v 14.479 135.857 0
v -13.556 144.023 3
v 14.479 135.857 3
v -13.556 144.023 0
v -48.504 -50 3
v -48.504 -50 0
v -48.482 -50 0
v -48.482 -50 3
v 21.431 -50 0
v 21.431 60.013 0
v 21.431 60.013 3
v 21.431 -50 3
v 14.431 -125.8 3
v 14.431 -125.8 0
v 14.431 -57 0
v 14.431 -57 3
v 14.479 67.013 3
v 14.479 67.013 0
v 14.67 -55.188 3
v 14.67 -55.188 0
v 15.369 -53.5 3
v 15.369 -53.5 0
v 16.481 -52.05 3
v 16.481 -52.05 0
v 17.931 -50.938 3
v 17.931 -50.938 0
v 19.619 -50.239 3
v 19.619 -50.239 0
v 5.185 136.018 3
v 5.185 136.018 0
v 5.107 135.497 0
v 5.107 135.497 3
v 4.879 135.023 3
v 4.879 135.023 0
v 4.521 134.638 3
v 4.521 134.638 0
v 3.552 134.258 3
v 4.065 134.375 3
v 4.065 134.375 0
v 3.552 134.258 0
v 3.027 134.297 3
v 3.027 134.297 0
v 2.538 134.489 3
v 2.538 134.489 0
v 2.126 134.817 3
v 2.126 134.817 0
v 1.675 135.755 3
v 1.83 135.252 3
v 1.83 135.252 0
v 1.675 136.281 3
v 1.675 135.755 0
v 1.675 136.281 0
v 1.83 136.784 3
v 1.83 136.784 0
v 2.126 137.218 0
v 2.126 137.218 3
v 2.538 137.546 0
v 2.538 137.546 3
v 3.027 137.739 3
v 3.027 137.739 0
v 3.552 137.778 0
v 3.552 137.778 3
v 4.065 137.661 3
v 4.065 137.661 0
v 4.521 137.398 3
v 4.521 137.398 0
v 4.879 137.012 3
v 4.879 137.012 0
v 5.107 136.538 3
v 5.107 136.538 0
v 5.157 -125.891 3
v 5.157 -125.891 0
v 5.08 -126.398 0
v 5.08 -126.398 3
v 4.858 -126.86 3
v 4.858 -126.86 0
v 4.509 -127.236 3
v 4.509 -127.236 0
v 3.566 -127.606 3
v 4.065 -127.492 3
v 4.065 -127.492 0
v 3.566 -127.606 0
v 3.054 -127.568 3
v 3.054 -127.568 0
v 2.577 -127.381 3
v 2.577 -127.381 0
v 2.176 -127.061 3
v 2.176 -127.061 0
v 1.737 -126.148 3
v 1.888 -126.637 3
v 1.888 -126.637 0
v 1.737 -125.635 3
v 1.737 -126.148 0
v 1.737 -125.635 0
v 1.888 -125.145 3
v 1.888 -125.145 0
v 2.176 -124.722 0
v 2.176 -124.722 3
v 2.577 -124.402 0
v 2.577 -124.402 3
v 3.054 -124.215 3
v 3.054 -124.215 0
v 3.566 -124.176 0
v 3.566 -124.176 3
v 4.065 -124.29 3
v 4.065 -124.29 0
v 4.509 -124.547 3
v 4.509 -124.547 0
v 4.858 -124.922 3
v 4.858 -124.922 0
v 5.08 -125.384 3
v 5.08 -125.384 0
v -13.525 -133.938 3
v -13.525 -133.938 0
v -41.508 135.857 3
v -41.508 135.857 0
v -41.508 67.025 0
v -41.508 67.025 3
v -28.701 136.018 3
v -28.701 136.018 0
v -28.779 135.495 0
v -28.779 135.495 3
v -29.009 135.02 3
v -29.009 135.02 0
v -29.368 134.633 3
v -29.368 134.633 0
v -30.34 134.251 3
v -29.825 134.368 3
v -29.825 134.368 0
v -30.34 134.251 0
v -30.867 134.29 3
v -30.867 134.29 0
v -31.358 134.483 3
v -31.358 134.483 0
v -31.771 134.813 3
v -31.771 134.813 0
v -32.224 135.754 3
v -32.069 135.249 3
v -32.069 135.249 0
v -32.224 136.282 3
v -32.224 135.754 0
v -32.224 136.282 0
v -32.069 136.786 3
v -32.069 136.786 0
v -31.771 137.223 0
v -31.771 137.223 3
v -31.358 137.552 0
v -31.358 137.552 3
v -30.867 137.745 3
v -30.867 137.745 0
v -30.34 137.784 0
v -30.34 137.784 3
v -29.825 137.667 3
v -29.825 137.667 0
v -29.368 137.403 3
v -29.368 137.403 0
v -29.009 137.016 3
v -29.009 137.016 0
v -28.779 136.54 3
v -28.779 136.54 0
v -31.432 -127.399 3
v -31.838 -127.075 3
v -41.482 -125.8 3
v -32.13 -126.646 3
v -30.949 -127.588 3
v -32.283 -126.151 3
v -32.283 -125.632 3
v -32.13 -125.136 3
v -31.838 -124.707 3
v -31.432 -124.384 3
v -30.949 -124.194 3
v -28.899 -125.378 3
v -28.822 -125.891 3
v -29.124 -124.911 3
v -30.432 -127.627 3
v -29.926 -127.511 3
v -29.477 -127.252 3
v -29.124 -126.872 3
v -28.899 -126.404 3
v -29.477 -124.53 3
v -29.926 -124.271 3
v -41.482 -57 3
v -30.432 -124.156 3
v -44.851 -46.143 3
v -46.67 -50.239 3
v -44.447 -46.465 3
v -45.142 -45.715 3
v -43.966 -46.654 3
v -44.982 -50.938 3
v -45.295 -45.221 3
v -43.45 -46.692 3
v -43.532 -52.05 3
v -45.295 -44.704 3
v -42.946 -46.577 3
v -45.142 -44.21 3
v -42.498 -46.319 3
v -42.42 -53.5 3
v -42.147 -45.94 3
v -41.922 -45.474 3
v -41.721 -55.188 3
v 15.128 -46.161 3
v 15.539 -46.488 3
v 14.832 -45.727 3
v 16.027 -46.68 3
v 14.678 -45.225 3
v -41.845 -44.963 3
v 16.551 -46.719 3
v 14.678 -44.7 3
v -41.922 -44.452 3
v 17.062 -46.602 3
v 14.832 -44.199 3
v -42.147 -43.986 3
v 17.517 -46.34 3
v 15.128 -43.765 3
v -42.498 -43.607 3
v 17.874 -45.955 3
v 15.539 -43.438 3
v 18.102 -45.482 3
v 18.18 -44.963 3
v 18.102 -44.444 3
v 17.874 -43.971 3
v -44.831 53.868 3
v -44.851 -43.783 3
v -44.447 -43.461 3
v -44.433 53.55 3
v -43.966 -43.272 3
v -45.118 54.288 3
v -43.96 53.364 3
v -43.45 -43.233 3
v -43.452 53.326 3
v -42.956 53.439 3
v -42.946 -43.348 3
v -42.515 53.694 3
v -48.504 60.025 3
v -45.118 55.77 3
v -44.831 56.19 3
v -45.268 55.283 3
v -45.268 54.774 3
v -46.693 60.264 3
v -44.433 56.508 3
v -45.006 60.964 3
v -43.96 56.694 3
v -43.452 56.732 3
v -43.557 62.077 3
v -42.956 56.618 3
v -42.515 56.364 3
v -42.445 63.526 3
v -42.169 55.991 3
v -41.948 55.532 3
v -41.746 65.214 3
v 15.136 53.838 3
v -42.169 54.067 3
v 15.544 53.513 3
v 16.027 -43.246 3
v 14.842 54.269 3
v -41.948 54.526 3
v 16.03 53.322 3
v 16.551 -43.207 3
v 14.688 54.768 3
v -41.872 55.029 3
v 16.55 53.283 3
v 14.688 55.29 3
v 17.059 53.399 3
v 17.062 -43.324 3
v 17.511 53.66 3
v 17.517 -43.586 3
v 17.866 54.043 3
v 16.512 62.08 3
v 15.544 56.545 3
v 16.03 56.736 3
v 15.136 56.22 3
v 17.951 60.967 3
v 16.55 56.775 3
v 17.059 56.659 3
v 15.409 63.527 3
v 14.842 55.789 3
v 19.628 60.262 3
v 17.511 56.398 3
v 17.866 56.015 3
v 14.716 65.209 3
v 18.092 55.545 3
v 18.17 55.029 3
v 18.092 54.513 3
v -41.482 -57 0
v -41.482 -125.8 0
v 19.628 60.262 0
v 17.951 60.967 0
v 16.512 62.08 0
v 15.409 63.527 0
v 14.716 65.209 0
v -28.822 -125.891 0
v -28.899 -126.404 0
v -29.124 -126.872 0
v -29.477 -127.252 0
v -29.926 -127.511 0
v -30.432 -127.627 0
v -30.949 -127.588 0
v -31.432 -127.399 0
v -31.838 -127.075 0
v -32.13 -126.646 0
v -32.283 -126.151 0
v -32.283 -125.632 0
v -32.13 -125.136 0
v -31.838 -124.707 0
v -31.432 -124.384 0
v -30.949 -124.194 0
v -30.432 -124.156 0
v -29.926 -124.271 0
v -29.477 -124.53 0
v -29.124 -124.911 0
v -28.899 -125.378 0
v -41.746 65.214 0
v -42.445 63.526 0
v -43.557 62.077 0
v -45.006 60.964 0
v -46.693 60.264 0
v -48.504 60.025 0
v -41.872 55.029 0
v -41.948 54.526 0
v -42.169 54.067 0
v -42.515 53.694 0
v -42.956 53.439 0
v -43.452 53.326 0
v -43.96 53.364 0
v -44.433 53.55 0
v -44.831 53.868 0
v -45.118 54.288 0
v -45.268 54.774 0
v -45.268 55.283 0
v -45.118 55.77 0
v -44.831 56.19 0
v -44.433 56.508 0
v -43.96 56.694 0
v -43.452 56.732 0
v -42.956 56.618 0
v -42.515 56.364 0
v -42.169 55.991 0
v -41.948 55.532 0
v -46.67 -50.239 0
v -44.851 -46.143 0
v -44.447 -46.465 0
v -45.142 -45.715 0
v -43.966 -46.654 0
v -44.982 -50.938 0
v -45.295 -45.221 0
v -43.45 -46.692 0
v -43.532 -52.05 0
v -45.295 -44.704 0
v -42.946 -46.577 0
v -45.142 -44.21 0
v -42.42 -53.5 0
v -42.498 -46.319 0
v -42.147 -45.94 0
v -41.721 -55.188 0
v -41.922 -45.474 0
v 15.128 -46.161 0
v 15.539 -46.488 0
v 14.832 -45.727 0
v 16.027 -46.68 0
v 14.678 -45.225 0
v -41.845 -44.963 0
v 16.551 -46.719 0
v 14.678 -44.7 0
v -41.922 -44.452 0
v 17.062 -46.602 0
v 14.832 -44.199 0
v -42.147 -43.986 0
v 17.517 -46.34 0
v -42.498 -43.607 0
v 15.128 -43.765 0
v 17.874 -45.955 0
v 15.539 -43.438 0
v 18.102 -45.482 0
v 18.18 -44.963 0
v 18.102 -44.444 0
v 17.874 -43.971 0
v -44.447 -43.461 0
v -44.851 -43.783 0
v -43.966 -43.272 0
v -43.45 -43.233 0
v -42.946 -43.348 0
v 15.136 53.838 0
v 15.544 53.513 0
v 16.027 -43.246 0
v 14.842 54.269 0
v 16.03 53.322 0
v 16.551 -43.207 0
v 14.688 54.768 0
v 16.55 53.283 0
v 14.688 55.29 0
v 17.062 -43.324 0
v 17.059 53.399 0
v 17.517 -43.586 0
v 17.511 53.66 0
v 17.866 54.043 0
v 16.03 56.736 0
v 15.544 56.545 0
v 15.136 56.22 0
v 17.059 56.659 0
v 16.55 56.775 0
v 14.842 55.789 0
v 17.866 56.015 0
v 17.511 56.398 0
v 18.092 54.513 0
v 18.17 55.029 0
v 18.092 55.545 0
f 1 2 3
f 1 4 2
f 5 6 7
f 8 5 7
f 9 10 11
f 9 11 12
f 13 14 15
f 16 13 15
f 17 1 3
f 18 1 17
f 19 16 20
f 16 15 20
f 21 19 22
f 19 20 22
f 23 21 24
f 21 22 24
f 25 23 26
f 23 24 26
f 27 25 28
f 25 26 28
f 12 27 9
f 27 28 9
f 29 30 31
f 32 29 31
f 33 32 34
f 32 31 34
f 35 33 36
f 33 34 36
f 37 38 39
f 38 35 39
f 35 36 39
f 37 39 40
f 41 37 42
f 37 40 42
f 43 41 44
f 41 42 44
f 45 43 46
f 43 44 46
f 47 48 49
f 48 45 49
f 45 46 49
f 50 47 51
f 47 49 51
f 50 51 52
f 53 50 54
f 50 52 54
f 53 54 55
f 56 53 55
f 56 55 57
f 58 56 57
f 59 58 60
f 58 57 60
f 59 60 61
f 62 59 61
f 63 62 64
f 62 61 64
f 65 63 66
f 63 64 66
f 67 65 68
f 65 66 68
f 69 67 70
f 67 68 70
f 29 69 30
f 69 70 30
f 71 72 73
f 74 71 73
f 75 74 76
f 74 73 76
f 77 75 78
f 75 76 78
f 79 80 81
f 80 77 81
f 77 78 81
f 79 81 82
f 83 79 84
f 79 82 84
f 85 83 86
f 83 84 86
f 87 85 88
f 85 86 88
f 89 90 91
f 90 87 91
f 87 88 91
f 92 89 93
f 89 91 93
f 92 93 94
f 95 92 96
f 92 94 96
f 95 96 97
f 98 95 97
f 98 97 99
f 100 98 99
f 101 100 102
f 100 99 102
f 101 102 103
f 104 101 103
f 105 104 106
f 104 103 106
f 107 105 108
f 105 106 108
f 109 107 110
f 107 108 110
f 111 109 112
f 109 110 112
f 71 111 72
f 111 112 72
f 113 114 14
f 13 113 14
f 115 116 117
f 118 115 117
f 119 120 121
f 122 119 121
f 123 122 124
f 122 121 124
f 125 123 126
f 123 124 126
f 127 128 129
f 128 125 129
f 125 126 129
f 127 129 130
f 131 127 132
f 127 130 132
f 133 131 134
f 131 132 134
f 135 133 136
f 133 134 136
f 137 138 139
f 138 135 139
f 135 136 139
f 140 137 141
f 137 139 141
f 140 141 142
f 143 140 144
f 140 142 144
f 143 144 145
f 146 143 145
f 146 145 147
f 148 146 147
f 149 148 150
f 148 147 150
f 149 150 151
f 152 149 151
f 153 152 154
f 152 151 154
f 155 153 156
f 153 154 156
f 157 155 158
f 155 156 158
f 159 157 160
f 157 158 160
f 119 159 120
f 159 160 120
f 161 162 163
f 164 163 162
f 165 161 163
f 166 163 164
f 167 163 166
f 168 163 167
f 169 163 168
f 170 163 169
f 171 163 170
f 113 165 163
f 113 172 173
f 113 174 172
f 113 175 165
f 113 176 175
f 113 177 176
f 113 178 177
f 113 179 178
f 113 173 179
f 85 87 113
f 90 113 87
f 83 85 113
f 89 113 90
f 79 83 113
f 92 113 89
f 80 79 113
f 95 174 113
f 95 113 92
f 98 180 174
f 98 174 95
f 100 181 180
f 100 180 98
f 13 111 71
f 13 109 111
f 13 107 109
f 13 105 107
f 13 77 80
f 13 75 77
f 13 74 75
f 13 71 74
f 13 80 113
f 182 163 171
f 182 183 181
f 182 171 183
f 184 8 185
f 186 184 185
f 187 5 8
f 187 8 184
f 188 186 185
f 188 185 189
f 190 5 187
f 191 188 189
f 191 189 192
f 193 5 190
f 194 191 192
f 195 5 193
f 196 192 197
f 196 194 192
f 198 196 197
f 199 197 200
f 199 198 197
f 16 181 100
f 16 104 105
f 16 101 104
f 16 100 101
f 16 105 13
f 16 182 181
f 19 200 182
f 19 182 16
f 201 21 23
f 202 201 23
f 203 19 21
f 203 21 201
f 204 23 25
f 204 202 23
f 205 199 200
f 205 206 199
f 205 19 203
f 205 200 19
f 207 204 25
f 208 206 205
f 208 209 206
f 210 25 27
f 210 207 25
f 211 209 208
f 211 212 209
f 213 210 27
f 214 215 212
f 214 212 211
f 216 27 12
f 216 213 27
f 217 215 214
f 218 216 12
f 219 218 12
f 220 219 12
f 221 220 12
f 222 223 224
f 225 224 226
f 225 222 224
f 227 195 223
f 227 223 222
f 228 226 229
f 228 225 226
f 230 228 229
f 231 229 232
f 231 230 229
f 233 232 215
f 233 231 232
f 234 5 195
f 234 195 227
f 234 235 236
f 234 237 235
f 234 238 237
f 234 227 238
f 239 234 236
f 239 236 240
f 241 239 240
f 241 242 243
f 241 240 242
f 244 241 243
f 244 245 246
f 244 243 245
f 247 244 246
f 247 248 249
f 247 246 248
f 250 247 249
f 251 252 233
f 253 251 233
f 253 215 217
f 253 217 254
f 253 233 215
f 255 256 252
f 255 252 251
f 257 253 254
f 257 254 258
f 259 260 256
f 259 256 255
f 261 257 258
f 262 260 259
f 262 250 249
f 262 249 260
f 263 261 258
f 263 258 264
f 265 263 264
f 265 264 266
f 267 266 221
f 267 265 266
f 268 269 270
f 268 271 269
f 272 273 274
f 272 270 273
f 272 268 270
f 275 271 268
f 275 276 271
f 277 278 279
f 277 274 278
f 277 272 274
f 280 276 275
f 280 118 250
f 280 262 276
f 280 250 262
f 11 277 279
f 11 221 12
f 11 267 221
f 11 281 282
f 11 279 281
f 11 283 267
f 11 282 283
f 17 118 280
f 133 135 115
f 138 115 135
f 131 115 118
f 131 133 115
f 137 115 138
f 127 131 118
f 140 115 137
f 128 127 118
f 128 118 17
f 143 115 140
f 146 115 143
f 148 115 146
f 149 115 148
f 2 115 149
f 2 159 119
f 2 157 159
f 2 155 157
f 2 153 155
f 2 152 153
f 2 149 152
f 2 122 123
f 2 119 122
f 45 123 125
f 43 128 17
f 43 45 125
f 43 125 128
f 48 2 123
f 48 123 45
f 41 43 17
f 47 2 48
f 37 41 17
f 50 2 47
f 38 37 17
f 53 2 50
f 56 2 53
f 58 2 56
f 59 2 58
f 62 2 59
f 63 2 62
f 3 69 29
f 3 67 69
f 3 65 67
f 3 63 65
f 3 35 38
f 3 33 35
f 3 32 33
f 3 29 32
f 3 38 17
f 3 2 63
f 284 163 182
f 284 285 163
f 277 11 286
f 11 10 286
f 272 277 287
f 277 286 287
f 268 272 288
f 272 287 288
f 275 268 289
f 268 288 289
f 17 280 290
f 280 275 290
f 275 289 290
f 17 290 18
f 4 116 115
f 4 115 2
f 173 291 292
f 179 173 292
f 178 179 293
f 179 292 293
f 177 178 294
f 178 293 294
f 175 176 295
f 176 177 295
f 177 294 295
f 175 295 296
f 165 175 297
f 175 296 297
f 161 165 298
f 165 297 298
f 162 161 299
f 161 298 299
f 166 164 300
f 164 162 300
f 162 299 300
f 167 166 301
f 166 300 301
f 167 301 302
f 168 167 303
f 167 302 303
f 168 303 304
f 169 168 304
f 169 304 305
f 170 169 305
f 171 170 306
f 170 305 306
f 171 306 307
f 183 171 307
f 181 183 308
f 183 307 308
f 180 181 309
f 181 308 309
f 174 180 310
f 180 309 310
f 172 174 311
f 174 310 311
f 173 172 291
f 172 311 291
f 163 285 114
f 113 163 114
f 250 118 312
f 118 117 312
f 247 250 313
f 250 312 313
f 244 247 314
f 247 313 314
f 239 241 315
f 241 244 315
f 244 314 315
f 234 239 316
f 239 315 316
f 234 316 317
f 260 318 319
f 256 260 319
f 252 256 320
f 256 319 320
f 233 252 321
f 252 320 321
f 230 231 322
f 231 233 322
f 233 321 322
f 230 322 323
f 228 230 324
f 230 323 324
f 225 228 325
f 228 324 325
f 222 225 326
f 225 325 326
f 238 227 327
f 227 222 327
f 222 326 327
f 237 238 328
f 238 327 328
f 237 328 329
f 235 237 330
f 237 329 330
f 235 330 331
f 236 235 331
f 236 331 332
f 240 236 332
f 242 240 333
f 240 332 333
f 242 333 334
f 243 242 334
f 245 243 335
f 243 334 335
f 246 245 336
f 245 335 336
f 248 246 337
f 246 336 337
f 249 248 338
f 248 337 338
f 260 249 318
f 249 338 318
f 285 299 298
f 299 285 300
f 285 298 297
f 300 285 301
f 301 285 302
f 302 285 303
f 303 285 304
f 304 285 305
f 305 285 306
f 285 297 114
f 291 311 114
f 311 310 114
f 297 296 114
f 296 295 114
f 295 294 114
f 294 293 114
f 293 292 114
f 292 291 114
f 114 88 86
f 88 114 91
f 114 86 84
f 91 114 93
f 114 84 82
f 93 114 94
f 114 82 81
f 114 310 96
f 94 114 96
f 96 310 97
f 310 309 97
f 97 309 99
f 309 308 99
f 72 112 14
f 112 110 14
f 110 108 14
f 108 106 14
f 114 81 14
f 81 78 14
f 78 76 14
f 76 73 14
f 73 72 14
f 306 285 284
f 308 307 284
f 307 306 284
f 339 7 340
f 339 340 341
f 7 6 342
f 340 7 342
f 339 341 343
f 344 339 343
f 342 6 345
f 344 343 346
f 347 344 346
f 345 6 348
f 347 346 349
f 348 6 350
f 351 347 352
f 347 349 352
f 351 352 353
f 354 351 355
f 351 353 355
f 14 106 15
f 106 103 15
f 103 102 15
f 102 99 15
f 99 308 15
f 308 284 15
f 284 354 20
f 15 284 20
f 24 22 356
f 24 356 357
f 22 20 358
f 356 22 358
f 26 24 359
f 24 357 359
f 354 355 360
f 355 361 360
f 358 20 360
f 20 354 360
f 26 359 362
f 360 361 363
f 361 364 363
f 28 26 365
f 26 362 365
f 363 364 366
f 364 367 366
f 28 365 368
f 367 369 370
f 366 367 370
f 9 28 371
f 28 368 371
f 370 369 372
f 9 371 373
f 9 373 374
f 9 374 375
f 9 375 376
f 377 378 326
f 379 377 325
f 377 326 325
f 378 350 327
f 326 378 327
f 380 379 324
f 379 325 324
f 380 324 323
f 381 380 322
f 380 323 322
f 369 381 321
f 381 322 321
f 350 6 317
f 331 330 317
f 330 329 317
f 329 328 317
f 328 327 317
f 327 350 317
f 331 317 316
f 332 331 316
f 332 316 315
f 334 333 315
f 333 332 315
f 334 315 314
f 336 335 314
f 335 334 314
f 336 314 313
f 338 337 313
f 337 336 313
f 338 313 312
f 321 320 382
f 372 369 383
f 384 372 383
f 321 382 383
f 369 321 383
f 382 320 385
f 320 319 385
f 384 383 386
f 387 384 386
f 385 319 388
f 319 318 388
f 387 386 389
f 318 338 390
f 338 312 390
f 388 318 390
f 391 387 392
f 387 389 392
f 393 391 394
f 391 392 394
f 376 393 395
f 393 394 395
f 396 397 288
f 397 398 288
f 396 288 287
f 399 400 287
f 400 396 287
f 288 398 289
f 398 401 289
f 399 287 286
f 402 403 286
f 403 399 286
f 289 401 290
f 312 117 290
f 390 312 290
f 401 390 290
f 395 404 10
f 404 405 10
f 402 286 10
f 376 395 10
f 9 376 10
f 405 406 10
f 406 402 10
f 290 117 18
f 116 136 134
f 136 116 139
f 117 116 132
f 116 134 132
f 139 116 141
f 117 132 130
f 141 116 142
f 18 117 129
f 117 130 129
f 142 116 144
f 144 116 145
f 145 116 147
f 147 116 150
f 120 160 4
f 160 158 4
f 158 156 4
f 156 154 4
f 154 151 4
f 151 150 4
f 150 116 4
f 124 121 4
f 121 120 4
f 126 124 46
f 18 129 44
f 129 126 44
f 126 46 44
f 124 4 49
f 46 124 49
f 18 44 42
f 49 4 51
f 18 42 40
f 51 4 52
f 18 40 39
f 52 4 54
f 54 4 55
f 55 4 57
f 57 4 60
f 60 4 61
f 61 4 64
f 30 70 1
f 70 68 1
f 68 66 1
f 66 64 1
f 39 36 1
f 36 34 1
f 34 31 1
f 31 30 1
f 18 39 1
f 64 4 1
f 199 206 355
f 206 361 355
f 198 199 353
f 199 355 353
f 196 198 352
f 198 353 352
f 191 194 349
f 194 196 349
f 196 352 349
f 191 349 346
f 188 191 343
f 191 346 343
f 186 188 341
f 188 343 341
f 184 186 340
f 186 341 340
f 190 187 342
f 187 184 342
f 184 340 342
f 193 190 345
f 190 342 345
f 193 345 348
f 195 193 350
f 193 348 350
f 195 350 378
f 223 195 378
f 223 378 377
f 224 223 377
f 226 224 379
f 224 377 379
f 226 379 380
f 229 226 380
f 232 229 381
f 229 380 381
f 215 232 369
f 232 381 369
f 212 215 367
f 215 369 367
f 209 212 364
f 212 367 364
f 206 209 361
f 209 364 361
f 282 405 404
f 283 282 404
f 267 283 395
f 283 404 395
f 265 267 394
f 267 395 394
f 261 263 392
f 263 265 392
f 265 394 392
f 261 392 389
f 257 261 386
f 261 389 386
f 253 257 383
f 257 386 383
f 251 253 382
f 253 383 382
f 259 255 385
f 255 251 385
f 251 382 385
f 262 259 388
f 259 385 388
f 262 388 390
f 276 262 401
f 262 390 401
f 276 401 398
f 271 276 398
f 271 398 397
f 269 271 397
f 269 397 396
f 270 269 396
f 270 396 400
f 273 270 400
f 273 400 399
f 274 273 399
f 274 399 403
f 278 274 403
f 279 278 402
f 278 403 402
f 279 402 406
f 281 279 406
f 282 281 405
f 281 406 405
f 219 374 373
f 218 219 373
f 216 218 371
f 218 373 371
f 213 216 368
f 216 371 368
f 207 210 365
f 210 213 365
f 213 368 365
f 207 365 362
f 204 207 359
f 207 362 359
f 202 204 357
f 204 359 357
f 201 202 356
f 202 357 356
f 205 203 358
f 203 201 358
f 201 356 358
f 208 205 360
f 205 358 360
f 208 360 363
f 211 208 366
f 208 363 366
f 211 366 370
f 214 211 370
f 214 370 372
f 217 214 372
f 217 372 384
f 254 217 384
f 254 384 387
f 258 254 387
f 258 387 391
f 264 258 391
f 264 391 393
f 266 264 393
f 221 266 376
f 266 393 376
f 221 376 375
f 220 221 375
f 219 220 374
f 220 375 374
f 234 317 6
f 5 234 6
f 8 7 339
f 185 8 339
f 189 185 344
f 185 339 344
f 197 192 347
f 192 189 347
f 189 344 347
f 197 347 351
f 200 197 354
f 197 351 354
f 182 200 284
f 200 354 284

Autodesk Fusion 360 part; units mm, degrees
sketch "Skizze1" plane through (0, 0, 0) normal (0, 0, 1) x (1, 0, 0)
  line L0 (-48.5045, 60.0252) -> (-48.5045, -50)
  line L1 (21.4307, 60.0126) -> (21.4307, -50)
  line L2 (-41.5077, 135.8568) -> (-13.5563, 144.0233)
  line L3 (-13.5563, 144.0233) -> (14.4793, 135.8568)
  line L4 (-41.4821, -125.8001) -> (-13.5254, -133.9377)
  line L5 (-13.5254, -133.9377) -> (14.4312, -125.8001)
  line L6 (14.4312, -125.8001) -> (14.4312, -57)
  line L7 (-41.4821, -125.8001) -> (-41.4821, -57)
  line L8 (-41.5077, 135.8568) -> (-41.5077, 66.6867)
  line L9 (14.4793, 135.8568) -> (14.4793, 66.6867)
  circle A0 centre (3.4202, 136.0177) radius 1.7651
  circle A1 centre (-30.4724, 136.0177) radius 1.7717
  circle A2 centre (-30.5621, -125.8912) radius 1.7405
  circle A3 centre (3.437, -125.8912) radius 1.7197
  circle A4 centre (-43.5796, -44.9629) radius 1.7343
  circle A5 centre (16.4191, -44.9629) radius 1.761
  circle A6 centre (-43.5796, 55.0289) radius 1.7075
  circle A7 centre (16.4191, 55.0289) radius 1.7507
  line L10 (21.4307, 60.0126) -> (21.4793, 60.0126)
  line L11 (14.4793, 67.0126) -> (14.4793, 66.6867)
  line L12 (-41.5077, 66.6867) -> (-41.5077, 67.0252)
  line L13 (-48.5077, 60.0252) -> (-48.5045, 60.0252)
  line L14 (-48.5045, -50) -> (-48.4821, -50)
  line L15 (21.4312, -50) -> (21.4307, -50)
  arc A8 (21.4312, -50) -> (14.4312, -57) centre (21.4312, -57) ccw
  arc A9 (-41.4821, -57) -> (-48.4821, -50) centre (-48.4821, -57) ccw
  arc A10 (-48.5077, 60.0252) -> (-41.5077, 67.0252) centre (-48.5077, 67.0252) ccw
  arc A11 (14.4793, 67.0126) -> (21.4793, 60.0126) centre (21.4793, 67.0126) ccw
  dimension "d1" = 7
  dimension "d2" = 7
  dimension "d3" = 7
  dimension "d4" = 7
extrude "Extrusion1" add sketch "Skizze1" along normal blind 3
